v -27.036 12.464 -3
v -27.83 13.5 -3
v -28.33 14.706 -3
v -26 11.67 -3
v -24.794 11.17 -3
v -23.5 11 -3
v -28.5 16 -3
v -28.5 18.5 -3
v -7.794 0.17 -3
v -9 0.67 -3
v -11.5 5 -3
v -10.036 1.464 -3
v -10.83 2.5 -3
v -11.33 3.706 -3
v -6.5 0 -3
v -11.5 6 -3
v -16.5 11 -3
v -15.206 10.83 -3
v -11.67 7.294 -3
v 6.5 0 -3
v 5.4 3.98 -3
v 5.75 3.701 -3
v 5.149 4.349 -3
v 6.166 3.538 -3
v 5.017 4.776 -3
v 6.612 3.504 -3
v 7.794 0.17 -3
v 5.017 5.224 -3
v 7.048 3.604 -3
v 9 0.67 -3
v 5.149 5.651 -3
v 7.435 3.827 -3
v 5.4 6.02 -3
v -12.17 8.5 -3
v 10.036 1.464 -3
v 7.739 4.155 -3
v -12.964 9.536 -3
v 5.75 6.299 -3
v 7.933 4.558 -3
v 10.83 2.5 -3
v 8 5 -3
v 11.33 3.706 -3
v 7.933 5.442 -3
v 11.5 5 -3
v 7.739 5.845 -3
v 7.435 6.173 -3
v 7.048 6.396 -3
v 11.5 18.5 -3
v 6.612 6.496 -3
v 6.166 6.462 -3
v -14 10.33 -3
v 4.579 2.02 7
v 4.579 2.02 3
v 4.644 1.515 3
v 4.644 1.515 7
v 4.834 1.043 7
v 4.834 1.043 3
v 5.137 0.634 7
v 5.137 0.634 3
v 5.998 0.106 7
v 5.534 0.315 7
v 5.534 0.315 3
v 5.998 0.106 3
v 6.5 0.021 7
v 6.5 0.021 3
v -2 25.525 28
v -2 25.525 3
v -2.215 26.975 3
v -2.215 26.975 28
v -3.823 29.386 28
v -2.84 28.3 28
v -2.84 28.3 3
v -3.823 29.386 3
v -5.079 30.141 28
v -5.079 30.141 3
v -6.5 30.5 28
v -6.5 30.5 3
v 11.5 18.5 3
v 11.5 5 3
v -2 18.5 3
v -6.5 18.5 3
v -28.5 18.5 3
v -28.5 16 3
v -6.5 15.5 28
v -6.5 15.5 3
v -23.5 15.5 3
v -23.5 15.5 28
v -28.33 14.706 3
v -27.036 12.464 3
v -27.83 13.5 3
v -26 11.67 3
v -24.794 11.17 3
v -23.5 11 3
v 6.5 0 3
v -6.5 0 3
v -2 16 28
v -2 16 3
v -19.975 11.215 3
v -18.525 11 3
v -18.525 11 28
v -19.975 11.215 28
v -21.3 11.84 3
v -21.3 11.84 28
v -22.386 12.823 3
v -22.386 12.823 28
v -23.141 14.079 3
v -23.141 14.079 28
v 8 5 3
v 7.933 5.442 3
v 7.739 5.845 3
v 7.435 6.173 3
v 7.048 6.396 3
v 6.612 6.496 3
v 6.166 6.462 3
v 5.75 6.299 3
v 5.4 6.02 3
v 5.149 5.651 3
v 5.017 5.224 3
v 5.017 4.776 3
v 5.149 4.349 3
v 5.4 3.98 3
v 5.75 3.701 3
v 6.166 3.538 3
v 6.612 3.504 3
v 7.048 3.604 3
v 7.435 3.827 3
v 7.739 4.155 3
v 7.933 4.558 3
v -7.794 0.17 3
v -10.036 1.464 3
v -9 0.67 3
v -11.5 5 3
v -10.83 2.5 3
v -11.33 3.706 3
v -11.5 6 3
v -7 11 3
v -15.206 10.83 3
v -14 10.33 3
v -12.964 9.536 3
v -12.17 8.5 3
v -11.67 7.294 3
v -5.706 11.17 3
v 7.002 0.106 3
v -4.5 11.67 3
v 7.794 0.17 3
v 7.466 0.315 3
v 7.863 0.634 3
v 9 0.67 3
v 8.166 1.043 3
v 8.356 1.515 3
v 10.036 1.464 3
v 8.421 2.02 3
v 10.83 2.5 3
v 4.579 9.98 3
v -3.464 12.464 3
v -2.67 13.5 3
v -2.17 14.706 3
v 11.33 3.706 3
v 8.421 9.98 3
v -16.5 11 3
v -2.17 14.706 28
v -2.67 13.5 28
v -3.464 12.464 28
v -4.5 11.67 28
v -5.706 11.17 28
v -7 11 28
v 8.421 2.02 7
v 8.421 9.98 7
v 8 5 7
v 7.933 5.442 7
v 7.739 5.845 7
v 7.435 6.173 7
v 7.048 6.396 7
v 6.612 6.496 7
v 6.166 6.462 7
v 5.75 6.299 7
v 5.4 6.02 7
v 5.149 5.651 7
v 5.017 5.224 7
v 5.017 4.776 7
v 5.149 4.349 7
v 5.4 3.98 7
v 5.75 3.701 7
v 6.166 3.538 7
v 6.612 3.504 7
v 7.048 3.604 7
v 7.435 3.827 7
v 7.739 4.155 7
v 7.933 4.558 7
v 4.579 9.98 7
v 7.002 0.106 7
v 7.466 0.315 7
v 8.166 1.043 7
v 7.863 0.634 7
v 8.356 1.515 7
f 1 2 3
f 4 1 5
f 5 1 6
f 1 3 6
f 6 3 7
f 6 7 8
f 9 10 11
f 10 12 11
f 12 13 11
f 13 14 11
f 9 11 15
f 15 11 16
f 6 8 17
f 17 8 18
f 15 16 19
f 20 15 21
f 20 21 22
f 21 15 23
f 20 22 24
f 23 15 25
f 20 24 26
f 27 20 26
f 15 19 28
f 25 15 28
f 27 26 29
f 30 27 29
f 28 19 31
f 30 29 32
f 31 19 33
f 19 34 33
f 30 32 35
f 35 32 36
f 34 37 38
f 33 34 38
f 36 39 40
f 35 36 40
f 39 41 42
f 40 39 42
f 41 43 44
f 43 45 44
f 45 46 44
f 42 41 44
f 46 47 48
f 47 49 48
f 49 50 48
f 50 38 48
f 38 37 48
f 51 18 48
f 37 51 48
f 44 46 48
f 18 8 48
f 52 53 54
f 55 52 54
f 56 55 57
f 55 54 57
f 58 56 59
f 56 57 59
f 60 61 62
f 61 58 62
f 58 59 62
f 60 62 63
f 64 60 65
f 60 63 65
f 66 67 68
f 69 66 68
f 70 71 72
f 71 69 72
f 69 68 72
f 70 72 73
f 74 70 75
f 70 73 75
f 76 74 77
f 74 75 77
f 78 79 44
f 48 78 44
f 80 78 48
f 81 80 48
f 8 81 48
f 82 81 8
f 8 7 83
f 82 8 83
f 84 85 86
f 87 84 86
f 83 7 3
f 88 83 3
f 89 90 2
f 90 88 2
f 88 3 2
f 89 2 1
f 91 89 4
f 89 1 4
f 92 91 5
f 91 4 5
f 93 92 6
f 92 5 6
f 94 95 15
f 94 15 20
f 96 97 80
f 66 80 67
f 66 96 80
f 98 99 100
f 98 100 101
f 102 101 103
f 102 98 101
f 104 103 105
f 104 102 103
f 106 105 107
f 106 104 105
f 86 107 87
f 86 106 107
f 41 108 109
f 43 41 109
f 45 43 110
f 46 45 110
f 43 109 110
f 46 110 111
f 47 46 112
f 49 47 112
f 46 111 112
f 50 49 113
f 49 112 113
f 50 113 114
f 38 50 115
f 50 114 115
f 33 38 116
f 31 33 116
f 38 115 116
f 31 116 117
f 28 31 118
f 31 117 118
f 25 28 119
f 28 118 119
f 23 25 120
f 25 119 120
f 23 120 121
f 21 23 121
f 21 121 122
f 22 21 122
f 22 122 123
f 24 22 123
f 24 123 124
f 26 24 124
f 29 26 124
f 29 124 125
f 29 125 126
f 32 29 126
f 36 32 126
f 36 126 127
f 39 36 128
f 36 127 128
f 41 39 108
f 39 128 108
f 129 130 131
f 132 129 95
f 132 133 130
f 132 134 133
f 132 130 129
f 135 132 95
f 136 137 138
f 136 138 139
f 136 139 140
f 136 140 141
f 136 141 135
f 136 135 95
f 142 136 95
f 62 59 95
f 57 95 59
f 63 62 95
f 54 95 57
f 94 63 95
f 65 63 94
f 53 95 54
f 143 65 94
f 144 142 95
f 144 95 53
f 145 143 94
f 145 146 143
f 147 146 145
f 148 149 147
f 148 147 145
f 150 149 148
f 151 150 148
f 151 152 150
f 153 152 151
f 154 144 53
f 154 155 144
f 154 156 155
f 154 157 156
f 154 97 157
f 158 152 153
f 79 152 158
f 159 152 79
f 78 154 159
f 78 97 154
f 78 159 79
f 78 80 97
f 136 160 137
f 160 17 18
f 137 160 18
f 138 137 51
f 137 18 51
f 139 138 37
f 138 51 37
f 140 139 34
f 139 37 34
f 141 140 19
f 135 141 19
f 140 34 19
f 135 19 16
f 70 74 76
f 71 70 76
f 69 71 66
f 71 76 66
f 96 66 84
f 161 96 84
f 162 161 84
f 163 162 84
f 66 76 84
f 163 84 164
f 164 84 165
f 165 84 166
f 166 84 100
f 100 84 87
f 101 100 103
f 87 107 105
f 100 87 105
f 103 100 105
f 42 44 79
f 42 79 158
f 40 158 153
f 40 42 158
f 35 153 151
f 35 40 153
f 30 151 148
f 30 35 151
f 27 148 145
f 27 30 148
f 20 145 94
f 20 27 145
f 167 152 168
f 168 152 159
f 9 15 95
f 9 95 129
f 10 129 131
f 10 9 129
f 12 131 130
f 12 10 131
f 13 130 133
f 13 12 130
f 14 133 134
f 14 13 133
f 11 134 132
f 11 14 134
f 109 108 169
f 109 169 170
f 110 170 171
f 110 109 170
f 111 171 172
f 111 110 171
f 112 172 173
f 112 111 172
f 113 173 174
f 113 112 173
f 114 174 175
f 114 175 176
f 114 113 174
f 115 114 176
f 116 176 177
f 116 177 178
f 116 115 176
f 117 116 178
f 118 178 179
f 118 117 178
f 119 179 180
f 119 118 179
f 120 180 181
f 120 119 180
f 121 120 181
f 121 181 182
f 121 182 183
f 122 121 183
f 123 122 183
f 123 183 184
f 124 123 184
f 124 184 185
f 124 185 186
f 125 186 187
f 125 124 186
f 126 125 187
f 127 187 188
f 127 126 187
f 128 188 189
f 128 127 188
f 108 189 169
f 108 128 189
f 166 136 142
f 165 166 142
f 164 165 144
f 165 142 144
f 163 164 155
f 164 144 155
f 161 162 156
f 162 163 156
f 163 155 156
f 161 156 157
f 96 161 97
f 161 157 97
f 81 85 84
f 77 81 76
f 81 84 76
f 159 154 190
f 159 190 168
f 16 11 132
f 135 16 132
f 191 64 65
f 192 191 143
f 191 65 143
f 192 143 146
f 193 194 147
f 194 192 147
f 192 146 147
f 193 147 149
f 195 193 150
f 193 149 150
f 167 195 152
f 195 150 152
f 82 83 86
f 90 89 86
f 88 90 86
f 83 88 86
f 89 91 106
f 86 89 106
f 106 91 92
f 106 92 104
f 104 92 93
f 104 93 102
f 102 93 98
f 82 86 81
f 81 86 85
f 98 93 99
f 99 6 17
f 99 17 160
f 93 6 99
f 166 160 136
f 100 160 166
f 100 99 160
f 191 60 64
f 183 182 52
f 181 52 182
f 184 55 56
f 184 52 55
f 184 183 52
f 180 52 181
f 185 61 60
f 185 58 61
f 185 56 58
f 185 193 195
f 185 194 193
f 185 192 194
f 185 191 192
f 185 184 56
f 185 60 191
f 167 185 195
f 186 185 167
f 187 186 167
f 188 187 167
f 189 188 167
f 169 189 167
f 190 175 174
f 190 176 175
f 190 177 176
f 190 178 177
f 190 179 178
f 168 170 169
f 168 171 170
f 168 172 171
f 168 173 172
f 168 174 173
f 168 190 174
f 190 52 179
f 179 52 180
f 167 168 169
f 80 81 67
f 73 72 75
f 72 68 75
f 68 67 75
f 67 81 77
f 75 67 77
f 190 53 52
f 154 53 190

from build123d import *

# Parameters (mm, degrees)
F0_W          = 23
F0_H          = 6
F1_DEPTH      = 11
F2_W          = 3.8415808491
F2_H          = 9.9605580419
F2_R          = 1.5
F3_DEPTH      = 4
F4_DEPTH      = 6
F5_T1_DEPTH   = 9
F6_W          = 23
F6_H          = 6
F6_W_2        = 17
F7_DEPTH      = 4.5
F8_W          = 12
F8_H          = 4.5
F8_W_2        = 5
F9_DEPTH      = 25
F11_DEPTH     = 3
F12_W         = 15
F12_H         = 25
F12_W_2       = 4.5
F13_DEPTH     = 4.5
F14_T1_DEPTH  = 6
F14_T3_DEPTH  = 49.8746859277
F14_T5_DEPTH  = 37.5
F14_T7_DEPTH  = 37.4373429638
F14_T9_DEPTH  = 31
F14_T11_DEPTH = 31
F14_T13_DEPTH = 31


# Not quite as in the source:
# - a fillet or chamfer that OpenCascade refuses, or shapes differently, is made with other operations: its cross-section is extruded or revolved along the edge and cut away or added


with BuildPart() as f1:
    # F0 (on Front) → F1 (new body)
    with BuildSketch(Plane.XZ):
        Rectangle(F0_W, F0_H)
    extrude(amount=-F1_DEPTH)

    # F2 (on face) → F3 (join)
    with BuildSketch(Plane.XY.offset(3)):
        with Locations((6.5, 5)):
            Rectangle(F2_W, F2_H)
        with Locations((6.5, 5)):
            Circle(F2_R, mode=Mode.SUBTRACT)
    extrude(amount=F3_DEPTH)

    # F4 (cut): a face of the model
    f4_faces = [f1.faces().sort_by_distance(p)[0] for p in [
        (6.5, 5, 3),
    ]]
    extrude(f4_faces, amount=-F4_DEPTH, mode=Mode.SUBTRACT)

    # F5: fillet of radius 2 on 2 edges, made by hand

    # F5_s2 → F5_t1 (cut)
    with BuildSketch(Plane.XY.offset(3)):
        with BuildLine():
            ThreePointArc((6.4207904246, 0.019720979), (7.8350039869, 0.6055074167), (8.4207904246, 2.019720979))
            Line((8.4207904246, 2.019720979), (8.4207904246, 0.019720979))
            Line((8.4207904246, 0.019720979), (6.4207904246, 0.019720979))
        make_face()
        with BuildLine():
            ThreePointArc((4.5792095754, 2.019720979), (5.1649960131, 0.6055074167), (6.5792095754, 0.019720979))
            Line((6.5792095754, 0.019720979), (4.5792095754, 0.019720979))
            Line((4.5792095754, 0.019720979), (4.5792095754, 2.019720979))
        make_face()
    extrude(amount=F5_T1_DEPTH, mode=Mode.SUBTRACT)

    # F6 (on face) → F7 (join)
    with BuildSketch(Plane(origin=(0, 11, 0), x_dir=(-1, 0, 0), z_dir=(0, 1, 0))):
        Rectangle(F6_W, F6_H)
        with Locations((20, 0)):
            Rectangle(F6_W_2, F6_H)
    extrude(amount=F7_DEPTH)

    # F8 (on face) → F9 (join)
    with BuildSketch(Plane.XY.offset(3)):
        with Locations((-17.5, 13.25)):
            Rectangle(F8_W, F8_H)
        with Locations((-9, 13.25)):
            Rectangle(F8_W_2, F8_H)
    extrude(amount=F9_DEPTH)

    # F10 (on face) → F11 (join)
    with BuildSketch(Plane(origin=(0, 15.5, 0), x_dir=(-1, 0, 0), z_dir=(0, 1, 0))):
        Polygon((6.5, 3), (-11.5, 3), (-11.5, -3), (28.5, -3), (28.5, 3), (23.5, 3), align=None)
    extrude(amount=F11_DEPTH)

    # F12 (on face) → F13 (join)
    with BuildSketch(Plane.YZ.offset(-6.5)):
        with Locations((23, 15.5)):
            Rectangle(F12_W, F12_H)
        with Locations((13.25, 15.5)):
            Rectangle(F12_W_2, F12_H)
    extrude(amount=F13_DEPTH)

    # F14: fillet of radius 5 on 7 edges, made by hand

    # F14_s2 → F14_t1 (join)
    with BuildSketch(Plane.XY.offset(-3)):
        with BuildLine():
            ThreePointArc((-16.5, 11), (-12.9644660941, 9.5355339059), (-11.5, 6))
            Line((-11.5, 6), (-11.5, 11))
            Line((-11.5, 11), (-16.5, 11))
        make_face()
    extrude(amount=F14_T1_DEPTH)

    # F14_s4 → F14_t3 (cut)
    with BuildSketch(Plane.XY.offset(-9.4373429638)):
        with BuildLine():
            ThreePointArc((-2, 25.5250628145), (-3.2919007565, 28.8791647807), (-6.5, 30.5))
            Line((-6.5, 30.5), (-2, 30.5))
            Line((-2, 30.5), (-2, 25.5250628145))
        make_face()
    extrude(amount=F14_T3_DEPTH, mode=Mode.SUBTRACT)

    # F14_s6 → F14_t5 (cut)
    with BuildSketch(Plane.XY.offset(3)):
        with BuildLine():
            ThreePointArc((-7, 11), (-3.4644660941, 12.4644660941), (-2, 16))
            Line((-2, 16), (-2, 11))
            Line((-2, 11), (-7, 11))
        make_face()
    extrude(amount=F14_T5_DEPTH, mode=Mode.SUBTRACT)

    # F14_s8 → F14_t7 (cut)
    with BuildSketch(Plane.XY.offset(3)):
        with BuildLine():
            ThreePointArc((-18.5250628145, 11), (-21.8791647807, 12.2919007565), (-23.5, 15.5))
            Line((-23.5, 15.5), (-23.5, 11))
            Line((-23.5, 11), (-18.5250628145, 11))
        make_face()
    extrude(amount=F14_T7_DEPTH, mode=Mode.SUBTRACT)

    # F14_s10 → F14_t9 (cut)
    with BuildSketch(Plane.XY.offset(-15.5)):
        with BuildLine():
            ThreePointArc((11.5, 5), (10.0355339059, 1.4644660941), (6.5, 0))
            Line((6.5, 0), (11.5, 0))
            Line((11.5, 0), (11.5, 5))
        make_face()
    extrude(amount=F14_T9_DEPTH, mode=Mode.SUBTRACT)

    # F14_s12 → F14_t11 (cut)
    with BuildSketch(Plane.XY.offset(-15.5)):
        with BuildLine():
            ThreePointArc((-6.5, 0), (-10.0355339059, 1.4644660941), (-11.5, 5))
            Line((-11.5, 5), (-11.5, 0))
            Line((-11.5, 0), (-6.5, 0))
        make_face()
    extrude(amount=F14_T11_DEPTH, mode=Mode.SUBTRACT)

    # F14_s14 → F14_t13 (cut)
    with BuildSketch(Plane.XY.offset(-15.5)):
        with BuildLine():
            ThreePointArc((-28.5, 16), (-27.0355339059, 12.4644660941), (-23.5, 11))
            Line((-23.5, 11), (-28.5, 11))
            Line((-28.5, 11), (-28.5, 16))
        make_face()
    extrude(amount=F14_T13_DEPTH, mode=Mode.SUBTRACT)


solid = f1.part
